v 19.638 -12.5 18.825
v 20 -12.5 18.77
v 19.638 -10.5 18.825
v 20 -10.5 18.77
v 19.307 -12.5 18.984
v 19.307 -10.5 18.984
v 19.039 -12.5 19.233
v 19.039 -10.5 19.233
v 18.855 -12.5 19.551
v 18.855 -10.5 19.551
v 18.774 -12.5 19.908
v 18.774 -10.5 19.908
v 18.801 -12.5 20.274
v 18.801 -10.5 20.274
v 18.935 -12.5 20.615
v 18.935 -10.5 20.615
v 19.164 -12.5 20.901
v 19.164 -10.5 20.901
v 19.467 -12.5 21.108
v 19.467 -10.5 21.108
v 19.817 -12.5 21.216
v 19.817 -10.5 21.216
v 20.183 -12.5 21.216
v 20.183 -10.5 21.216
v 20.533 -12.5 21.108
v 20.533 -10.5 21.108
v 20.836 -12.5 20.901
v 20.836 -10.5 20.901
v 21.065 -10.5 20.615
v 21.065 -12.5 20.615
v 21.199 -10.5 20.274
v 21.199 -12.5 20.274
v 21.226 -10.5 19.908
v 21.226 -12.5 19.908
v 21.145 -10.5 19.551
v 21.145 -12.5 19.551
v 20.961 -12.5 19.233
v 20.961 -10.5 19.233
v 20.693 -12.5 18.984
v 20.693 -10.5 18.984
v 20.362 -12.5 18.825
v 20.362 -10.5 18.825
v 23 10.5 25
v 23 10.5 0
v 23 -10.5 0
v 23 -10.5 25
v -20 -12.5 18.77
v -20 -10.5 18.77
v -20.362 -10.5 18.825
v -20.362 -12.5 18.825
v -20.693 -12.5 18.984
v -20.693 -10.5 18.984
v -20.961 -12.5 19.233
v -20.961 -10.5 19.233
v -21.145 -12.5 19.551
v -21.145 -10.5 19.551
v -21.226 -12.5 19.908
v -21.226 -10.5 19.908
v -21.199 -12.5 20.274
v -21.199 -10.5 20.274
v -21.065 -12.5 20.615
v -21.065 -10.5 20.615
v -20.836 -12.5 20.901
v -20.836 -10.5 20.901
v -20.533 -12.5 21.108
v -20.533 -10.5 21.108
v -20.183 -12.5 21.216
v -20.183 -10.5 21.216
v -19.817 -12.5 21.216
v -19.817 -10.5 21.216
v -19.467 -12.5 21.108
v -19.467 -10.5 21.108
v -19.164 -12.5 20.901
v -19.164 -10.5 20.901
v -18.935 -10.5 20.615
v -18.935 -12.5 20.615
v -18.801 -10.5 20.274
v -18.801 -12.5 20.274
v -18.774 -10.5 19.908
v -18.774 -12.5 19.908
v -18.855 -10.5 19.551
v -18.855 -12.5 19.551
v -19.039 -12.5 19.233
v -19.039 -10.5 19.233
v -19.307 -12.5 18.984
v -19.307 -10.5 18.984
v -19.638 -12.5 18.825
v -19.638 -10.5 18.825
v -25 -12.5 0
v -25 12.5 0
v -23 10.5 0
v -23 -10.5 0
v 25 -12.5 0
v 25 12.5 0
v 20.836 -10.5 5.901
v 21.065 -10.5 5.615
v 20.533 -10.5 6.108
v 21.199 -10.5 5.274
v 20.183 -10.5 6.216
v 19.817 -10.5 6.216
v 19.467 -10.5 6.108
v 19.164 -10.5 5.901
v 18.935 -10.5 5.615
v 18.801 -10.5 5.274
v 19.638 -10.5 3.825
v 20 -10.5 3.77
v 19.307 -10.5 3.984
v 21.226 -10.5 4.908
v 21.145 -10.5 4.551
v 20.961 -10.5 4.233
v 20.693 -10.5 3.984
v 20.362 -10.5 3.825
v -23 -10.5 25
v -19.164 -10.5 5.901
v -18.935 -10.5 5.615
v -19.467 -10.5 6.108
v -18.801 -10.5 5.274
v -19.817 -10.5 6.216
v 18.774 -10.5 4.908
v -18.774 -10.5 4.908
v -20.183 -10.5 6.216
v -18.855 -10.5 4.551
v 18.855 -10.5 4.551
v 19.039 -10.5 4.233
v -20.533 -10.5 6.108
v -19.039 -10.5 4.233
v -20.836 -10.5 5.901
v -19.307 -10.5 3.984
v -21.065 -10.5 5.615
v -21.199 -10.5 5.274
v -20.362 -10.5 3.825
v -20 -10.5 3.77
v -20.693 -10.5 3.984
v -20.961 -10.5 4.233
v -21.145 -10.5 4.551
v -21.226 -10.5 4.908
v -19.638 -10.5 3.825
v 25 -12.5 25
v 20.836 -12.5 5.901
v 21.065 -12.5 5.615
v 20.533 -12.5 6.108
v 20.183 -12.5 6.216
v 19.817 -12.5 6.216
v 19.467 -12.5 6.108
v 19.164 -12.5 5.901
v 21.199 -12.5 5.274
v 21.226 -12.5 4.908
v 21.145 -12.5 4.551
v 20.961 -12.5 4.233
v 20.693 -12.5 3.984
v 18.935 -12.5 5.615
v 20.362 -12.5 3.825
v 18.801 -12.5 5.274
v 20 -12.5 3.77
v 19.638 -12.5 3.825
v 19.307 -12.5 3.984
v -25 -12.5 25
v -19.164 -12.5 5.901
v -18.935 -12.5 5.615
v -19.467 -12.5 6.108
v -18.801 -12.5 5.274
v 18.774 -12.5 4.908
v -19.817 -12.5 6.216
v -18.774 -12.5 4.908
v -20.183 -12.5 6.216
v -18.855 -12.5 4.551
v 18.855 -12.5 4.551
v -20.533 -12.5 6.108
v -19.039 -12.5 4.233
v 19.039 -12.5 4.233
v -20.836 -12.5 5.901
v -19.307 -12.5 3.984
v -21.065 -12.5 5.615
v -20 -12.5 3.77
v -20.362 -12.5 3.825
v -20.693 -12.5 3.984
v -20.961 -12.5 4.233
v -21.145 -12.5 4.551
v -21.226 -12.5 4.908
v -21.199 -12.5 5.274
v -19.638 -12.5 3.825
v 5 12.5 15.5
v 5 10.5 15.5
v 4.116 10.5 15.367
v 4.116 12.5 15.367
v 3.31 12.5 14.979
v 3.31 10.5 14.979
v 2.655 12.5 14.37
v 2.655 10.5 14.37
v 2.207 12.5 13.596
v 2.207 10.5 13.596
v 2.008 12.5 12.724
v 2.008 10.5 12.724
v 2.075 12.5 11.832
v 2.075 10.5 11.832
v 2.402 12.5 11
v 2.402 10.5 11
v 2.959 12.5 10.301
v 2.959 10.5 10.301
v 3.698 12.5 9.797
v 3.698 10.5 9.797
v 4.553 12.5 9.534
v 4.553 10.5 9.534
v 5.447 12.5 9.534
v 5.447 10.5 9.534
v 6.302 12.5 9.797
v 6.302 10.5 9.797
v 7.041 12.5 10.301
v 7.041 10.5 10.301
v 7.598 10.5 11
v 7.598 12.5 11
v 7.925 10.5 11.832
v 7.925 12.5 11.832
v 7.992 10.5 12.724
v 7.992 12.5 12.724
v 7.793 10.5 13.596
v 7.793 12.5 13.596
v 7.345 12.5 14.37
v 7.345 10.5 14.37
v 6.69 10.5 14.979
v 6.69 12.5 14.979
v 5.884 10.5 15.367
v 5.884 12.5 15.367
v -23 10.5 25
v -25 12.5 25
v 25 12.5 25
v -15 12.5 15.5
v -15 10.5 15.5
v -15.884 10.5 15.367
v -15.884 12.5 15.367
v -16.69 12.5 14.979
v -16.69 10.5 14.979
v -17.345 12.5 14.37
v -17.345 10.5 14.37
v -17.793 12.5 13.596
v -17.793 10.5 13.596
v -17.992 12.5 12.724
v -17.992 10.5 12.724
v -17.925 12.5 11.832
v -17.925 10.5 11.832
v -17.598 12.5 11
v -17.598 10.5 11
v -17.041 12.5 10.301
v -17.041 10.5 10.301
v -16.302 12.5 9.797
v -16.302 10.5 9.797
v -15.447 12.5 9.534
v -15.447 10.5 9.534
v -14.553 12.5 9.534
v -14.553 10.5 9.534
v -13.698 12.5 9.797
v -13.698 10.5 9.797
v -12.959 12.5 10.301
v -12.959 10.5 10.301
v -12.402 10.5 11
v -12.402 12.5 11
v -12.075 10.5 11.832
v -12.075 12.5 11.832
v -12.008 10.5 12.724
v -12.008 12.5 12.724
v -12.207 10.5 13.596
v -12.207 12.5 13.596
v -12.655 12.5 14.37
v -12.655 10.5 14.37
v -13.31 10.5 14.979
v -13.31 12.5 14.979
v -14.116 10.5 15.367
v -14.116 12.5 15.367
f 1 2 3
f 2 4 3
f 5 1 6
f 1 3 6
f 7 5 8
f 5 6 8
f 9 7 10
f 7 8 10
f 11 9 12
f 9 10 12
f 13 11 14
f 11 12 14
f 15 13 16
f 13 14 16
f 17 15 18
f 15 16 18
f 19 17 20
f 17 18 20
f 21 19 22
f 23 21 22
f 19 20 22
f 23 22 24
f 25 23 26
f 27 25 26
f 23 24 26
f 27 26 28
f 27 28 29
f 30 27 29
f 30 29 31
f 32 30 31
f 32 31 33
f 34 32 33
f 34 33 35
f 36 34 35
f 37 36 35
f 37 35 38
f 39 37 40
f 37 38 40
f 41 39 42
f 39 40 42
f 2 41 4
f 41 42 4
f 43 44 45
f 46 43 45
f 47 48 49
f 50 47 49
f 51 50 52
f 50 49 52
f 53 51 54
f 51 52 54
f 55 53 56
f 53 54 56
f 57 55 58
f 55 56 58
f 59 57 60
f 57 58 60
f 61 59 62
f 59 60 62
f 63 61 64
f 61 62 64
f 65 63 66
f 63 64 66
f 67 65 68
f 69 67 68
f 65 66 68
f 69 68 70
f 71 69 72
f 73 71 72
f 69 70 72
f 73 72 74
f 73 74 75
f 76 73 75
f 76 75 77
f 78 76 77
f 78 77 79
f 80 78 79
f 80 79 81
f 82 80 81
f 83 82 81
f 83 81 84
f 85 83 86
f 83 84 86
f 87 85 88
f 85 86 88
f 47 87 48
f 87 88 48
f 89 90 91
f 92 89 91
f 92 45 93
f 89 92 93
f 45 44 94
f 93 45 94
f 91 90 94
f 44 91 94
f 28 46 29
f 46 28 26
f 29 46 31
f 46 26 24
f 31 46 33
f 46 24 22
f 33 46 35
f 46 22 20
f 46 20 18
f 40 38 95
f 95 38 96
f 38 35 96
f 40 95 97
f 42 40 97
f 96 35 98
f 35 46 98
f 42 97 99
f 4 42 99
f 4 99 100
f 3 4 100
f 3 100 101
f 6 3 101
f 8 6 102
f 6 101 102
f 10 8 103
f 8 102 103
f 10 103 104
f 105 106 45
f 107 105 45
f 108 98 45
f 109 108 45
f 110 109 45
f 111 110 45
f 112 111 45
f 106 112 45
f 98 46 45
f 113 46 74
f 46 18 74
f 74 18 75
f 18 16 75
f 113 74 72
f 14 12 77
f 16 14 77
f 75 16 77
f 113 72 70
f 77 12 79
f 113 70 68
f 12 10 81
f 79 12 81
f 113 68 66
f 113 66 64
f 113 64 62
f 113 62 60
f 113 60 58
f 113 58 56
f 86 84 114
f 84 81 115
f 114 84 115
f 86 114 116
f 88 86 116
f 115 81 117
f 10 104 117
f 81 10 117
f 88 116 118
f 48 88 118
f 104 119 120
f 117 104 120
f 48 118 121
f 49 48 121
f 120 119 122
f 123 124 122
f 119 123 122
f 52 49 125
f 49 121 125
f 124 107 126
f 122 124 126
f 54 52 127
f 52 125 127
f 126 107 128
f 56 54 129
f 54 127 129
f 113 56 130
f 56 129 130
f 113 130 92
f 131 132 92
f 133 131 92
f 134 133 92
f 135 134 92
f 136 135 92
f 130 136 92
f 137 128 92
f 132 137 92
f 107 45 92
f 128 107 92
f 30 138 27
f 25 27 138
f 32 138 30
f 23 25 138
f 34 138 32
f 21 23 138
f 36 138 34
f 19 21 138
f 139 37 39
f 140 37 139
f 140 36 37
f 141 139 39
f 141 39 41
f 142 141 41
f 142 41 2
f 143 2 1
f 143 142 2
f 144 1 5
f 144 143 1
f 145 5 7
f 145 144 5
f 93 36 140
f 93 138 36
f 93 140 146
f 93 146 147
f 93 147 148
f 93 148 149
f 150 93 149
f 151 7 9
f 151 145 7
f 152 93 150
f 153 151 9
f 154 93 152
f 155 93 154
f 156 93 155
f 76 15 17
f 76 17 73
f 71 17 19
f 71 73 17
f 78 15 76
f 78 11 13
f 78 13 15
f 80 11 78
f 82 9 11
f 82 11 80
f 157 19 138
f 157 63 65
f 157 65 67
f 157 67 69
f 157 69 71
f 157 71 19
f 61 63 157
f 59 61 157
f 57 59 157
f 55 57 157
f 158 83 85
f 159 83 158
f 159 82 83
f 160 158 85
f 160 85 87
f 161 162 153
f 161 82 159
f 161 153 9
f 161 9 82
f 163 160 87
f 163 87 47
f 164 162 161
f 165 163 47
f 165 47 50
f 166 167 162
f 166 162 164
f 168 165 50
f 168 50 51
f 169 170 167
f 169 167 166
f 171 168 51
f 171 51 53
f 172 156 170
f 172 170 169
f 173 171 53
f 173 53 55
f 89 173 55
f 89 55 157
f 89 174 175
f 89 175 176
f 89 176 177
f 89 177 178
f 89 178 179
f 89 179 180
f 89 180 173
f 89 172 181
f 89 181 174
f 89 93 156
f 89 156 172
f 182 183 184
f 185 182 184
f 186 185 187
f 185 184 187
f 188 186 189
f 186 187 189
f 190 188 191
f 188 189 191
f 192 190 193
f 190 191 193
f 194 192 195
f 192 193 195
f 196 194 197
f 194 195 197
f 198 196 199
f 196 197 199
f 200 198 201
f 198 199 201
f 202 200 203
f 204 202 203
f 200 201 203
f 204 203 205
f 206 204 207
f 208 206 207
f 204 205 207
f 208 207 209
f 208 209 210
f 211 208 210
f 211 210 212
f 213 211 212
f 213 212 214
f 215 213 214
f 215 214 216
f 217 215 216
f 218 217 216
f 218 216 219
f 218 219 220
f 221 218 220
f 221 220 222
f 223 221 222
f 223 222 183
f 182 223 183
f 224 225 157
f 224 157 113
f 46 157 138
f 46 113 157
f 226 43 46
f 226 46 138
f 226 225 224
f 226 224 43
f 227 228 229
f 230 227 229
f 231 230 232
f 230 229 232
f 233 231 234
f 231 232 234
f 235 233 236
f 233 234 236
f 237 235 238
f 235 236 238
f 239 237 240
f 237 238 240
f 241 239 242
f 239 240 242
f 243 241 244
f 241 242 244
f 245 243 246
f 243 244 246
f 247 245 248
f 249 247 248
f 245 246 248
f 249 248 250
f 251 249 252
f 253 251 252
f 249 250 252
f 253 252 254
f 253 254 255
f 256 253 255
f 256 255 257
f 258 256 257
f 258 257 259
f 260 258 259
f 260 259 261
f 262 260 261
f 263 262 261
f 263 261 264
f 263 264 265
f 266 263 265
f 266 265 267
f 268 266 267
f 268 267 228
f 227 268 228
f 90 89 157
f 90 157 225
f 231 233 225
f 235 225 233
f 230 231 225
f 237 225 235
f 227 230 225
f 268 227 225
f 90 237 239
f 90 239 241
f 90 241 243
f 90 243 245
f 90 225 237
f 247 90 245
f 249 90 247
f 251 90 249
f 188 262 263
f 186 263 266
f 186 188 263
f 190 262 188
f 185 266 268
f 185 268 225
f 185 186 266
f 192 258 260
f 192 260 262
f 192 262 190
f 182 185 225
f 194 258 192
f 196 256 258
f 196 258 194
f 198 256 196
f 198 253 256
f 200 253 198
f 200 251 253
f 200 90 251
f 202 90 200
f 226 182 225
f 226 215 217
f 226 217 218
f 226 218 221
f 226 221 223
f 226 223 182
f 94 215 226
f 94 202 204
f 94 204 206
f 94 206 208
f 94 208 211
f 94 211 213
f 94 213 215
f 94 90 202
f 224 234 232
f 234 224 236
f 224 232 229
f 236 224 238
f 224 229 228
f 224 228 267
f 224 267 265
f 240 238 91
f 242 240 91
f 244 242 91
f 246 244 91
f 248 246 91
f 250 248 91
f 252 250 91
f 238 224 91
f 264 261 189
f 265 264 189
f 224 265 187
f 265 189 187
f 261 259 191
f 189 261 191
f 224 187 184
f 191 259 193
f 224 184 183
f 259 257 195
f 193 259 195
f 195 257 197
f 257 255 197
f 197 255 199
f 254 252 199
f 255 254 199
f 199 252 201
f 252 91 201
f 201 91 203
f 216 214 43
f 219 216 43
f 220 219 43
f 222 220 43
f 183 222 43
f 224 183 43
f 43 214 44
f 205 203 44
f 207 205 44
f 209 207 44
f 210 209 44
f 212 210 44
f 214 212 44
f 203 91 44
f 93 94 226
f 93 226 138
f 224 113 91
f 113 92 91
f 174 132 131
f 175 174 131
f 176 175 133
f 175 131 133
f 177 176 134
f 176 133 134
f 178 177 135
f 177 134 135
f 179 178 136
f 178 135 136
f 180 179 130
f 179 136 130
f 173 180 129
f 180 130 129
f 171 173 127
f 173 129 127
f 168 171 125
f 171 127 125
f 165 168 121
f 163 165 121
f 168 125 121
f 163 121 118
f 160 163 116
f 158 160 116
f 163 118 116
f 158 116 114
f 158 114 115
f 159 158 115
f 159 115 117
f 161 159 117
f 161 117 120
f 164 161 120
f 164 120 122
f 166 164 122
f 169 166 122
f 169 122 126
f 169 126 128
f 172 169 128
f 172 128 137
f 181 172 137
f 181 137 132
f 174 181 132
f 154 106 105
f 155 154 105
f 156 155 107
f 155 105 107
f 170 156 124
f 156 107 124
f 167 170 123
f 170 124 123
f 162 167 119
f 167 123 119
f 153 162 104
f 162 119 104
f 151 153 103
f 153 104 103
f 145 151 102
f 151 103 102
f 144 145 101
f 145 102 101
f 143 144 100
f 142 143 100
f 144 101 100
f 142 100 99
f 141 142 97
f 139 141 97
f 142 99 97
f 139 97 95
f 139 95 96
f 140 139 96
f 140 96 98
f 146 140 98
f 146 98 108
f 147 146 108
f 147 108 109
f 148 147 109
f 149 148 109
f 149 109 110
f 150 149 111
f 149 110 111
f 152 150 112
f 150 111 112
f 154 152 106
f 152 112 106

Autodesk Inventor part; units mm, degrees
ref_plane "YZ Plane" through (0, 0, 0) normal (1, 0, 0) x (0, 1, 0)
ref_plane "XZ Plane" through (0, 0, 0) normal (0, 1, 0) x (-1, 0, 0)
ref_plane "XY Plane" through (0, 0, 0) normal (0, 0, 1) x (1, 0, 0)
sketch "スケッチ1" plane through (0, 0, 0) normal (0, 0, 1) x (1, 0, 0)
  line L0 (-25, 12.5) -> (25, 12.5)
  line L1 (25, 12.5) -> (25, -12.5)
  line L2 (25, -12.5) -> (-25, -12.5)
  line L3 (-25, -12.5) -> (-25, 12.5)
  line L4 (-23, 10.5) -> (23, 10.5)
  line L5 (23, 10.5) -> (23, -10.5)
  line L6 (23, -10.5) -> (-23, -10.5)
  line L7 (-23, -10.5) -> (-23, 10.5)
  point P0 (0, 0)
  dimension "d0" = 50
  dimension "d1" = 25
  dimension "d2" = 12.5
  dimension "d3" = 25
  dimension "d4" = 2
  dimension "d5" = 2
  dimension "d6" = 2
  dimension "d7" = 2
extrude "押し出し1" add sketch "スケッチ1" along normal blind 25
sketch "スケッチ4" plane through (-25, -12.5, 0) normal (0, -1, 0) x (1, 0, 0)
  line L0 (50, 25) -> (0, 25) projected
  line L1 (0, 0) -> (0, 25) projected
  line L2 (50, 0) -> (0, 0) projected
  line L3 (50, 0) -> (50, 25) projected
  point P0 (25, 0)
  point P1 (5, 20)
  point P2 (5, 5)
  point P3 (45, 5)
  point P4 (45, 20)
  dimension "d27" = 5
  dimension "d28" = 5
  dimension "d29" = 5
  dimension "d30" = 5
  dimension "d31" = 5
  dimension "d32" = 5
  dimension "d33" = 5
  dimension "d34" = 5
hole "Hole3" at (-20, -12.5, 20) at (-20, -12.5, 5) at (20, -12.5, 5) at (20, -12.5, 20) direction (0, 1, 0) diameter 2.459 end up to surface thread size "M3x0.5" class "6H" standard "ISO Metric profile"
sketch "スケッチ5" plane through (-25, 12.5, 0) normal (0, 1, 0) x (1, 0, 0)
  line L0 (0, 0) -> (50, 0) projected
  line L1 (0, 0) -> (0, -25) projected
  point P0 (25, 0)
  point P1 (10, -12.5)
  point P2 (30, -12.5)
  dimension "d42" = 10
  dimension "d43" = 20
  dimension "d44" = 12.5
  dimension "d45" = 12.5
hole "Hole4" at (-15, 12.5, 12.5) at (5, 12.5, 12.5) direction (0, -1, 0) diameter 6 end up to surface
equation "\"d2\" = 0.5 * d1"
equation "\"d3\" = 0.5 * d0"
equation "\"d5\" = d4"
equation "\"d6\" = d4"
equation "\"d7\" = d4"
equation "\"d28\" = d27"
equation "\"d29\" = d27"
equation "\"d30\" = d27"
equation "\"d31\" = d27"
equation "\"d32\" = d27"
equation "\"d33\" = d27"
equation "\"d34\" = d27"
equation "\"d45\" = d44"
properties part number "JointC0"
